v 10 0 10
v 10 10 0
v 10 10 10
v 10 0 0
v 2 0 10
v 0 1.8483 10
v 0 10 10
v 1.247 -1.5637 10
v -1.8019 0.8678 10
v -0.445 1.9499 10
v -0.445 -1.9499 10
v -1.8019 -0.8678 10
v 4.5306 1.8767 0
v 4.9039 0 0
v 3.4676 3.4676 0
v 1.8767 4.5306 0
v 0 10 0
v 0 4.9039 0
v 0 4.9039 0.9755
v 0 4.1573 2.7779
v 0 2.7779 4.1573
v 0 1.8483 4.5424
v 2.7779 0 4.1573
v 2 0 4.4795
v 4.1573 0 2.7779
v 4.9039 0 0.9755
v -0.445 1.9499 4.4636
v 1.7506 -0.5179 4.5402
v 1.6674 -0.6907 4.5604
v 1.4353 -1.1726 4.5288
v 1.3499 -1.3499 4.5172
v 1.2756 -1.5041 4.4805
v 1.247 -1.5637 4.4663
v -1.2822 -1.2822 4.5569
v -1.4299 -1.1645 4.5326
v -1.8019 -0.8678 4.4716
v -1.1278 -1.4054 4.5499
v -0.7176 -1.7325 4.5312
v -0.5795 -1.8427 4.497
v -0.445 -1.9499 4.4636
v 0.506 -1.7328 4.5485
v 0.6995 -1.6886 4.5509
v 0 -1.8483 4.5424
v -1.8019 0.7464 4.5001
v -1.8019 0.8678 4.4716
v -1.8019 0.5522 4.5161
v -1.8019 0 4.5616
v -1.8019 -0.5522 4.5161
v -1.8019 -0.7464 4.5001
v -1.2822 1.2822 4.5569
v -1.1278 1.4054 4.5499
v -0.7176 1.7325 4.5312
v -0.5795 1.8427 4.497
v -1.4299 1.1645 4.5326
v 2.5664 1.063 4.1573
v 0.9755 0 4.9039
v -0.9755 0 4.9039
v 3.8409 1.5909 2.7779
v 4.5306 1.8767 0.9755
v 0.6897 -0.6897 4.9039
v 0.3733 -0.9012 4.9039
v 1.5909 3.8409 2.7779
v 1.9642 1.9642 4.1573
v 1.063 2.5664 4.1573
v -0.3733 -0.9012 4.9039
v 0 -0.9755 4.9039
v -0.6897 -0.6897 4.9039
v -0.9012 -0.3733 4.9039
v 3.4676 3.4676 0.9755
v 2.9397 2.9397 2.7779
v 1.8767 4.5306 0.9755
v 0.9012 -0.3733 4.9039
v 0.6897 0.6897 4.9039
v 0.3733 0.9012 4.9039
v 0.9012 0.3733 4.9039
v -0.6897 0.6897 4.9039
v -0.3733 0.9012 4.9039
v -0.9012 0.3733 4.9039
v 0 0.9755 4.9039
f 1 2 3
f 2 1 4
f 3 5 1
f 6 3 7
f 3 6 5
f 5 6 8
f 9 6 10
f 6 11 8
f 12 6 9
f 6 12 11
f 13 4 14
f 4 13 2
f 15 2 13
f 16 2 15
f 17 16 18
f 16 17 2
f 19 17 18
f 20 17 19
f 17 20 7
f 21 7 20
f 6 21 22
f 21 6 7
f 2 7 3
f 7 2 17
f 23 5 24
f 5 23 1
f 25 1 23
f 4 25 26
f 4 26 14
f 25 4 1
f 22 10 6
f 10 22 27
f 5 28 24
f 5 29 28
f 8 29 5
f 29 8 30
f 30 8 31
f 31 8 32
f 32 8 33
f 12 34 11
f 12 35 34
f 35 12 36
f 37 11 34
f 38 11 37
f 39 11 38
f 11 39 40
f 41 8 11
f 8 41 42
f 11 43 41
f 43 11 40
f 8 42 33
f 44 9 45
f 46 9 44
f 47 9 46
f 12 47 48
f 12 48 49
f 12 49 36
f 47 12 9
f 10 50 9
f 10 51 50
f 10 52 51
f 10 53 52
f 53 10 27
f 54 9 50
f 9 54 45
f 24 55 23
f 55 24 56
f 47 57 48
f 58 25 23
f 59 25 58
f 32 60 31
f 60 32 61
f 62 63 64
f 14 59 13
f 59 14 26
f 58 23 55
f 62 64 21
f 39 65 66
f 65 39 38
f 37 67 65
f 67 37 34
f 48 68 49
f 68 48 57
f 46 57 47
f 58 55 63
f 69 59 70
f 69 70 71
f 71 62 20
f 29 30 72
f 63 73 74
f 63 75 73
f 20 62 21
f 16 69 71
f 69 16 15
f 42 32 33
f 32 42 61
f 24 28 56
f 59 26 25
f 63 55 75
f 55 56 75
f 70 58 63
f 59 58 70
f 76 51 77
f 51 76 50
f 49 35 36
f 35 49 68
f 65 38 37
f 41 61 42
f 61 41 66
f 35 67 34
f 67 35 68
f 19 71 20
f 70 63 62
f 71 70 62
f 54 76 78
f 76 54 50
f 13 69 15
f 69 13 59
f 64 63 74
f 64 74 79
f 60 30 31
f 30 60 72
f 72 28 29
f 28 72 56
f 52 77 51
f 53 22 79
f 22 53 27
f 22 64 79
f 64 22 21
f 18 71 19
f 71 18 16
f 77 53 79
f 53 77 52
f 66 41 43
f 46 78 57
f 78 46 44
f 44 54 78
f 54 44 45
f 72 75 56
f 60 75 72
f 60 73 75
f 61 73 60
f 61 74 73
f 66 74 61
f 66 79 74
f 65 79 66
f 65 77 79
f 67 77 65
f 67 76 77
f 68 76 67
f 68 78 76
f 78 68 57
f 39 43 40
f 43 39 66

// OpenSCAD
difference() {
	union() {
		cube(10);
		cylinder(h=10, r=2);
	}
	sphere(5);
}
